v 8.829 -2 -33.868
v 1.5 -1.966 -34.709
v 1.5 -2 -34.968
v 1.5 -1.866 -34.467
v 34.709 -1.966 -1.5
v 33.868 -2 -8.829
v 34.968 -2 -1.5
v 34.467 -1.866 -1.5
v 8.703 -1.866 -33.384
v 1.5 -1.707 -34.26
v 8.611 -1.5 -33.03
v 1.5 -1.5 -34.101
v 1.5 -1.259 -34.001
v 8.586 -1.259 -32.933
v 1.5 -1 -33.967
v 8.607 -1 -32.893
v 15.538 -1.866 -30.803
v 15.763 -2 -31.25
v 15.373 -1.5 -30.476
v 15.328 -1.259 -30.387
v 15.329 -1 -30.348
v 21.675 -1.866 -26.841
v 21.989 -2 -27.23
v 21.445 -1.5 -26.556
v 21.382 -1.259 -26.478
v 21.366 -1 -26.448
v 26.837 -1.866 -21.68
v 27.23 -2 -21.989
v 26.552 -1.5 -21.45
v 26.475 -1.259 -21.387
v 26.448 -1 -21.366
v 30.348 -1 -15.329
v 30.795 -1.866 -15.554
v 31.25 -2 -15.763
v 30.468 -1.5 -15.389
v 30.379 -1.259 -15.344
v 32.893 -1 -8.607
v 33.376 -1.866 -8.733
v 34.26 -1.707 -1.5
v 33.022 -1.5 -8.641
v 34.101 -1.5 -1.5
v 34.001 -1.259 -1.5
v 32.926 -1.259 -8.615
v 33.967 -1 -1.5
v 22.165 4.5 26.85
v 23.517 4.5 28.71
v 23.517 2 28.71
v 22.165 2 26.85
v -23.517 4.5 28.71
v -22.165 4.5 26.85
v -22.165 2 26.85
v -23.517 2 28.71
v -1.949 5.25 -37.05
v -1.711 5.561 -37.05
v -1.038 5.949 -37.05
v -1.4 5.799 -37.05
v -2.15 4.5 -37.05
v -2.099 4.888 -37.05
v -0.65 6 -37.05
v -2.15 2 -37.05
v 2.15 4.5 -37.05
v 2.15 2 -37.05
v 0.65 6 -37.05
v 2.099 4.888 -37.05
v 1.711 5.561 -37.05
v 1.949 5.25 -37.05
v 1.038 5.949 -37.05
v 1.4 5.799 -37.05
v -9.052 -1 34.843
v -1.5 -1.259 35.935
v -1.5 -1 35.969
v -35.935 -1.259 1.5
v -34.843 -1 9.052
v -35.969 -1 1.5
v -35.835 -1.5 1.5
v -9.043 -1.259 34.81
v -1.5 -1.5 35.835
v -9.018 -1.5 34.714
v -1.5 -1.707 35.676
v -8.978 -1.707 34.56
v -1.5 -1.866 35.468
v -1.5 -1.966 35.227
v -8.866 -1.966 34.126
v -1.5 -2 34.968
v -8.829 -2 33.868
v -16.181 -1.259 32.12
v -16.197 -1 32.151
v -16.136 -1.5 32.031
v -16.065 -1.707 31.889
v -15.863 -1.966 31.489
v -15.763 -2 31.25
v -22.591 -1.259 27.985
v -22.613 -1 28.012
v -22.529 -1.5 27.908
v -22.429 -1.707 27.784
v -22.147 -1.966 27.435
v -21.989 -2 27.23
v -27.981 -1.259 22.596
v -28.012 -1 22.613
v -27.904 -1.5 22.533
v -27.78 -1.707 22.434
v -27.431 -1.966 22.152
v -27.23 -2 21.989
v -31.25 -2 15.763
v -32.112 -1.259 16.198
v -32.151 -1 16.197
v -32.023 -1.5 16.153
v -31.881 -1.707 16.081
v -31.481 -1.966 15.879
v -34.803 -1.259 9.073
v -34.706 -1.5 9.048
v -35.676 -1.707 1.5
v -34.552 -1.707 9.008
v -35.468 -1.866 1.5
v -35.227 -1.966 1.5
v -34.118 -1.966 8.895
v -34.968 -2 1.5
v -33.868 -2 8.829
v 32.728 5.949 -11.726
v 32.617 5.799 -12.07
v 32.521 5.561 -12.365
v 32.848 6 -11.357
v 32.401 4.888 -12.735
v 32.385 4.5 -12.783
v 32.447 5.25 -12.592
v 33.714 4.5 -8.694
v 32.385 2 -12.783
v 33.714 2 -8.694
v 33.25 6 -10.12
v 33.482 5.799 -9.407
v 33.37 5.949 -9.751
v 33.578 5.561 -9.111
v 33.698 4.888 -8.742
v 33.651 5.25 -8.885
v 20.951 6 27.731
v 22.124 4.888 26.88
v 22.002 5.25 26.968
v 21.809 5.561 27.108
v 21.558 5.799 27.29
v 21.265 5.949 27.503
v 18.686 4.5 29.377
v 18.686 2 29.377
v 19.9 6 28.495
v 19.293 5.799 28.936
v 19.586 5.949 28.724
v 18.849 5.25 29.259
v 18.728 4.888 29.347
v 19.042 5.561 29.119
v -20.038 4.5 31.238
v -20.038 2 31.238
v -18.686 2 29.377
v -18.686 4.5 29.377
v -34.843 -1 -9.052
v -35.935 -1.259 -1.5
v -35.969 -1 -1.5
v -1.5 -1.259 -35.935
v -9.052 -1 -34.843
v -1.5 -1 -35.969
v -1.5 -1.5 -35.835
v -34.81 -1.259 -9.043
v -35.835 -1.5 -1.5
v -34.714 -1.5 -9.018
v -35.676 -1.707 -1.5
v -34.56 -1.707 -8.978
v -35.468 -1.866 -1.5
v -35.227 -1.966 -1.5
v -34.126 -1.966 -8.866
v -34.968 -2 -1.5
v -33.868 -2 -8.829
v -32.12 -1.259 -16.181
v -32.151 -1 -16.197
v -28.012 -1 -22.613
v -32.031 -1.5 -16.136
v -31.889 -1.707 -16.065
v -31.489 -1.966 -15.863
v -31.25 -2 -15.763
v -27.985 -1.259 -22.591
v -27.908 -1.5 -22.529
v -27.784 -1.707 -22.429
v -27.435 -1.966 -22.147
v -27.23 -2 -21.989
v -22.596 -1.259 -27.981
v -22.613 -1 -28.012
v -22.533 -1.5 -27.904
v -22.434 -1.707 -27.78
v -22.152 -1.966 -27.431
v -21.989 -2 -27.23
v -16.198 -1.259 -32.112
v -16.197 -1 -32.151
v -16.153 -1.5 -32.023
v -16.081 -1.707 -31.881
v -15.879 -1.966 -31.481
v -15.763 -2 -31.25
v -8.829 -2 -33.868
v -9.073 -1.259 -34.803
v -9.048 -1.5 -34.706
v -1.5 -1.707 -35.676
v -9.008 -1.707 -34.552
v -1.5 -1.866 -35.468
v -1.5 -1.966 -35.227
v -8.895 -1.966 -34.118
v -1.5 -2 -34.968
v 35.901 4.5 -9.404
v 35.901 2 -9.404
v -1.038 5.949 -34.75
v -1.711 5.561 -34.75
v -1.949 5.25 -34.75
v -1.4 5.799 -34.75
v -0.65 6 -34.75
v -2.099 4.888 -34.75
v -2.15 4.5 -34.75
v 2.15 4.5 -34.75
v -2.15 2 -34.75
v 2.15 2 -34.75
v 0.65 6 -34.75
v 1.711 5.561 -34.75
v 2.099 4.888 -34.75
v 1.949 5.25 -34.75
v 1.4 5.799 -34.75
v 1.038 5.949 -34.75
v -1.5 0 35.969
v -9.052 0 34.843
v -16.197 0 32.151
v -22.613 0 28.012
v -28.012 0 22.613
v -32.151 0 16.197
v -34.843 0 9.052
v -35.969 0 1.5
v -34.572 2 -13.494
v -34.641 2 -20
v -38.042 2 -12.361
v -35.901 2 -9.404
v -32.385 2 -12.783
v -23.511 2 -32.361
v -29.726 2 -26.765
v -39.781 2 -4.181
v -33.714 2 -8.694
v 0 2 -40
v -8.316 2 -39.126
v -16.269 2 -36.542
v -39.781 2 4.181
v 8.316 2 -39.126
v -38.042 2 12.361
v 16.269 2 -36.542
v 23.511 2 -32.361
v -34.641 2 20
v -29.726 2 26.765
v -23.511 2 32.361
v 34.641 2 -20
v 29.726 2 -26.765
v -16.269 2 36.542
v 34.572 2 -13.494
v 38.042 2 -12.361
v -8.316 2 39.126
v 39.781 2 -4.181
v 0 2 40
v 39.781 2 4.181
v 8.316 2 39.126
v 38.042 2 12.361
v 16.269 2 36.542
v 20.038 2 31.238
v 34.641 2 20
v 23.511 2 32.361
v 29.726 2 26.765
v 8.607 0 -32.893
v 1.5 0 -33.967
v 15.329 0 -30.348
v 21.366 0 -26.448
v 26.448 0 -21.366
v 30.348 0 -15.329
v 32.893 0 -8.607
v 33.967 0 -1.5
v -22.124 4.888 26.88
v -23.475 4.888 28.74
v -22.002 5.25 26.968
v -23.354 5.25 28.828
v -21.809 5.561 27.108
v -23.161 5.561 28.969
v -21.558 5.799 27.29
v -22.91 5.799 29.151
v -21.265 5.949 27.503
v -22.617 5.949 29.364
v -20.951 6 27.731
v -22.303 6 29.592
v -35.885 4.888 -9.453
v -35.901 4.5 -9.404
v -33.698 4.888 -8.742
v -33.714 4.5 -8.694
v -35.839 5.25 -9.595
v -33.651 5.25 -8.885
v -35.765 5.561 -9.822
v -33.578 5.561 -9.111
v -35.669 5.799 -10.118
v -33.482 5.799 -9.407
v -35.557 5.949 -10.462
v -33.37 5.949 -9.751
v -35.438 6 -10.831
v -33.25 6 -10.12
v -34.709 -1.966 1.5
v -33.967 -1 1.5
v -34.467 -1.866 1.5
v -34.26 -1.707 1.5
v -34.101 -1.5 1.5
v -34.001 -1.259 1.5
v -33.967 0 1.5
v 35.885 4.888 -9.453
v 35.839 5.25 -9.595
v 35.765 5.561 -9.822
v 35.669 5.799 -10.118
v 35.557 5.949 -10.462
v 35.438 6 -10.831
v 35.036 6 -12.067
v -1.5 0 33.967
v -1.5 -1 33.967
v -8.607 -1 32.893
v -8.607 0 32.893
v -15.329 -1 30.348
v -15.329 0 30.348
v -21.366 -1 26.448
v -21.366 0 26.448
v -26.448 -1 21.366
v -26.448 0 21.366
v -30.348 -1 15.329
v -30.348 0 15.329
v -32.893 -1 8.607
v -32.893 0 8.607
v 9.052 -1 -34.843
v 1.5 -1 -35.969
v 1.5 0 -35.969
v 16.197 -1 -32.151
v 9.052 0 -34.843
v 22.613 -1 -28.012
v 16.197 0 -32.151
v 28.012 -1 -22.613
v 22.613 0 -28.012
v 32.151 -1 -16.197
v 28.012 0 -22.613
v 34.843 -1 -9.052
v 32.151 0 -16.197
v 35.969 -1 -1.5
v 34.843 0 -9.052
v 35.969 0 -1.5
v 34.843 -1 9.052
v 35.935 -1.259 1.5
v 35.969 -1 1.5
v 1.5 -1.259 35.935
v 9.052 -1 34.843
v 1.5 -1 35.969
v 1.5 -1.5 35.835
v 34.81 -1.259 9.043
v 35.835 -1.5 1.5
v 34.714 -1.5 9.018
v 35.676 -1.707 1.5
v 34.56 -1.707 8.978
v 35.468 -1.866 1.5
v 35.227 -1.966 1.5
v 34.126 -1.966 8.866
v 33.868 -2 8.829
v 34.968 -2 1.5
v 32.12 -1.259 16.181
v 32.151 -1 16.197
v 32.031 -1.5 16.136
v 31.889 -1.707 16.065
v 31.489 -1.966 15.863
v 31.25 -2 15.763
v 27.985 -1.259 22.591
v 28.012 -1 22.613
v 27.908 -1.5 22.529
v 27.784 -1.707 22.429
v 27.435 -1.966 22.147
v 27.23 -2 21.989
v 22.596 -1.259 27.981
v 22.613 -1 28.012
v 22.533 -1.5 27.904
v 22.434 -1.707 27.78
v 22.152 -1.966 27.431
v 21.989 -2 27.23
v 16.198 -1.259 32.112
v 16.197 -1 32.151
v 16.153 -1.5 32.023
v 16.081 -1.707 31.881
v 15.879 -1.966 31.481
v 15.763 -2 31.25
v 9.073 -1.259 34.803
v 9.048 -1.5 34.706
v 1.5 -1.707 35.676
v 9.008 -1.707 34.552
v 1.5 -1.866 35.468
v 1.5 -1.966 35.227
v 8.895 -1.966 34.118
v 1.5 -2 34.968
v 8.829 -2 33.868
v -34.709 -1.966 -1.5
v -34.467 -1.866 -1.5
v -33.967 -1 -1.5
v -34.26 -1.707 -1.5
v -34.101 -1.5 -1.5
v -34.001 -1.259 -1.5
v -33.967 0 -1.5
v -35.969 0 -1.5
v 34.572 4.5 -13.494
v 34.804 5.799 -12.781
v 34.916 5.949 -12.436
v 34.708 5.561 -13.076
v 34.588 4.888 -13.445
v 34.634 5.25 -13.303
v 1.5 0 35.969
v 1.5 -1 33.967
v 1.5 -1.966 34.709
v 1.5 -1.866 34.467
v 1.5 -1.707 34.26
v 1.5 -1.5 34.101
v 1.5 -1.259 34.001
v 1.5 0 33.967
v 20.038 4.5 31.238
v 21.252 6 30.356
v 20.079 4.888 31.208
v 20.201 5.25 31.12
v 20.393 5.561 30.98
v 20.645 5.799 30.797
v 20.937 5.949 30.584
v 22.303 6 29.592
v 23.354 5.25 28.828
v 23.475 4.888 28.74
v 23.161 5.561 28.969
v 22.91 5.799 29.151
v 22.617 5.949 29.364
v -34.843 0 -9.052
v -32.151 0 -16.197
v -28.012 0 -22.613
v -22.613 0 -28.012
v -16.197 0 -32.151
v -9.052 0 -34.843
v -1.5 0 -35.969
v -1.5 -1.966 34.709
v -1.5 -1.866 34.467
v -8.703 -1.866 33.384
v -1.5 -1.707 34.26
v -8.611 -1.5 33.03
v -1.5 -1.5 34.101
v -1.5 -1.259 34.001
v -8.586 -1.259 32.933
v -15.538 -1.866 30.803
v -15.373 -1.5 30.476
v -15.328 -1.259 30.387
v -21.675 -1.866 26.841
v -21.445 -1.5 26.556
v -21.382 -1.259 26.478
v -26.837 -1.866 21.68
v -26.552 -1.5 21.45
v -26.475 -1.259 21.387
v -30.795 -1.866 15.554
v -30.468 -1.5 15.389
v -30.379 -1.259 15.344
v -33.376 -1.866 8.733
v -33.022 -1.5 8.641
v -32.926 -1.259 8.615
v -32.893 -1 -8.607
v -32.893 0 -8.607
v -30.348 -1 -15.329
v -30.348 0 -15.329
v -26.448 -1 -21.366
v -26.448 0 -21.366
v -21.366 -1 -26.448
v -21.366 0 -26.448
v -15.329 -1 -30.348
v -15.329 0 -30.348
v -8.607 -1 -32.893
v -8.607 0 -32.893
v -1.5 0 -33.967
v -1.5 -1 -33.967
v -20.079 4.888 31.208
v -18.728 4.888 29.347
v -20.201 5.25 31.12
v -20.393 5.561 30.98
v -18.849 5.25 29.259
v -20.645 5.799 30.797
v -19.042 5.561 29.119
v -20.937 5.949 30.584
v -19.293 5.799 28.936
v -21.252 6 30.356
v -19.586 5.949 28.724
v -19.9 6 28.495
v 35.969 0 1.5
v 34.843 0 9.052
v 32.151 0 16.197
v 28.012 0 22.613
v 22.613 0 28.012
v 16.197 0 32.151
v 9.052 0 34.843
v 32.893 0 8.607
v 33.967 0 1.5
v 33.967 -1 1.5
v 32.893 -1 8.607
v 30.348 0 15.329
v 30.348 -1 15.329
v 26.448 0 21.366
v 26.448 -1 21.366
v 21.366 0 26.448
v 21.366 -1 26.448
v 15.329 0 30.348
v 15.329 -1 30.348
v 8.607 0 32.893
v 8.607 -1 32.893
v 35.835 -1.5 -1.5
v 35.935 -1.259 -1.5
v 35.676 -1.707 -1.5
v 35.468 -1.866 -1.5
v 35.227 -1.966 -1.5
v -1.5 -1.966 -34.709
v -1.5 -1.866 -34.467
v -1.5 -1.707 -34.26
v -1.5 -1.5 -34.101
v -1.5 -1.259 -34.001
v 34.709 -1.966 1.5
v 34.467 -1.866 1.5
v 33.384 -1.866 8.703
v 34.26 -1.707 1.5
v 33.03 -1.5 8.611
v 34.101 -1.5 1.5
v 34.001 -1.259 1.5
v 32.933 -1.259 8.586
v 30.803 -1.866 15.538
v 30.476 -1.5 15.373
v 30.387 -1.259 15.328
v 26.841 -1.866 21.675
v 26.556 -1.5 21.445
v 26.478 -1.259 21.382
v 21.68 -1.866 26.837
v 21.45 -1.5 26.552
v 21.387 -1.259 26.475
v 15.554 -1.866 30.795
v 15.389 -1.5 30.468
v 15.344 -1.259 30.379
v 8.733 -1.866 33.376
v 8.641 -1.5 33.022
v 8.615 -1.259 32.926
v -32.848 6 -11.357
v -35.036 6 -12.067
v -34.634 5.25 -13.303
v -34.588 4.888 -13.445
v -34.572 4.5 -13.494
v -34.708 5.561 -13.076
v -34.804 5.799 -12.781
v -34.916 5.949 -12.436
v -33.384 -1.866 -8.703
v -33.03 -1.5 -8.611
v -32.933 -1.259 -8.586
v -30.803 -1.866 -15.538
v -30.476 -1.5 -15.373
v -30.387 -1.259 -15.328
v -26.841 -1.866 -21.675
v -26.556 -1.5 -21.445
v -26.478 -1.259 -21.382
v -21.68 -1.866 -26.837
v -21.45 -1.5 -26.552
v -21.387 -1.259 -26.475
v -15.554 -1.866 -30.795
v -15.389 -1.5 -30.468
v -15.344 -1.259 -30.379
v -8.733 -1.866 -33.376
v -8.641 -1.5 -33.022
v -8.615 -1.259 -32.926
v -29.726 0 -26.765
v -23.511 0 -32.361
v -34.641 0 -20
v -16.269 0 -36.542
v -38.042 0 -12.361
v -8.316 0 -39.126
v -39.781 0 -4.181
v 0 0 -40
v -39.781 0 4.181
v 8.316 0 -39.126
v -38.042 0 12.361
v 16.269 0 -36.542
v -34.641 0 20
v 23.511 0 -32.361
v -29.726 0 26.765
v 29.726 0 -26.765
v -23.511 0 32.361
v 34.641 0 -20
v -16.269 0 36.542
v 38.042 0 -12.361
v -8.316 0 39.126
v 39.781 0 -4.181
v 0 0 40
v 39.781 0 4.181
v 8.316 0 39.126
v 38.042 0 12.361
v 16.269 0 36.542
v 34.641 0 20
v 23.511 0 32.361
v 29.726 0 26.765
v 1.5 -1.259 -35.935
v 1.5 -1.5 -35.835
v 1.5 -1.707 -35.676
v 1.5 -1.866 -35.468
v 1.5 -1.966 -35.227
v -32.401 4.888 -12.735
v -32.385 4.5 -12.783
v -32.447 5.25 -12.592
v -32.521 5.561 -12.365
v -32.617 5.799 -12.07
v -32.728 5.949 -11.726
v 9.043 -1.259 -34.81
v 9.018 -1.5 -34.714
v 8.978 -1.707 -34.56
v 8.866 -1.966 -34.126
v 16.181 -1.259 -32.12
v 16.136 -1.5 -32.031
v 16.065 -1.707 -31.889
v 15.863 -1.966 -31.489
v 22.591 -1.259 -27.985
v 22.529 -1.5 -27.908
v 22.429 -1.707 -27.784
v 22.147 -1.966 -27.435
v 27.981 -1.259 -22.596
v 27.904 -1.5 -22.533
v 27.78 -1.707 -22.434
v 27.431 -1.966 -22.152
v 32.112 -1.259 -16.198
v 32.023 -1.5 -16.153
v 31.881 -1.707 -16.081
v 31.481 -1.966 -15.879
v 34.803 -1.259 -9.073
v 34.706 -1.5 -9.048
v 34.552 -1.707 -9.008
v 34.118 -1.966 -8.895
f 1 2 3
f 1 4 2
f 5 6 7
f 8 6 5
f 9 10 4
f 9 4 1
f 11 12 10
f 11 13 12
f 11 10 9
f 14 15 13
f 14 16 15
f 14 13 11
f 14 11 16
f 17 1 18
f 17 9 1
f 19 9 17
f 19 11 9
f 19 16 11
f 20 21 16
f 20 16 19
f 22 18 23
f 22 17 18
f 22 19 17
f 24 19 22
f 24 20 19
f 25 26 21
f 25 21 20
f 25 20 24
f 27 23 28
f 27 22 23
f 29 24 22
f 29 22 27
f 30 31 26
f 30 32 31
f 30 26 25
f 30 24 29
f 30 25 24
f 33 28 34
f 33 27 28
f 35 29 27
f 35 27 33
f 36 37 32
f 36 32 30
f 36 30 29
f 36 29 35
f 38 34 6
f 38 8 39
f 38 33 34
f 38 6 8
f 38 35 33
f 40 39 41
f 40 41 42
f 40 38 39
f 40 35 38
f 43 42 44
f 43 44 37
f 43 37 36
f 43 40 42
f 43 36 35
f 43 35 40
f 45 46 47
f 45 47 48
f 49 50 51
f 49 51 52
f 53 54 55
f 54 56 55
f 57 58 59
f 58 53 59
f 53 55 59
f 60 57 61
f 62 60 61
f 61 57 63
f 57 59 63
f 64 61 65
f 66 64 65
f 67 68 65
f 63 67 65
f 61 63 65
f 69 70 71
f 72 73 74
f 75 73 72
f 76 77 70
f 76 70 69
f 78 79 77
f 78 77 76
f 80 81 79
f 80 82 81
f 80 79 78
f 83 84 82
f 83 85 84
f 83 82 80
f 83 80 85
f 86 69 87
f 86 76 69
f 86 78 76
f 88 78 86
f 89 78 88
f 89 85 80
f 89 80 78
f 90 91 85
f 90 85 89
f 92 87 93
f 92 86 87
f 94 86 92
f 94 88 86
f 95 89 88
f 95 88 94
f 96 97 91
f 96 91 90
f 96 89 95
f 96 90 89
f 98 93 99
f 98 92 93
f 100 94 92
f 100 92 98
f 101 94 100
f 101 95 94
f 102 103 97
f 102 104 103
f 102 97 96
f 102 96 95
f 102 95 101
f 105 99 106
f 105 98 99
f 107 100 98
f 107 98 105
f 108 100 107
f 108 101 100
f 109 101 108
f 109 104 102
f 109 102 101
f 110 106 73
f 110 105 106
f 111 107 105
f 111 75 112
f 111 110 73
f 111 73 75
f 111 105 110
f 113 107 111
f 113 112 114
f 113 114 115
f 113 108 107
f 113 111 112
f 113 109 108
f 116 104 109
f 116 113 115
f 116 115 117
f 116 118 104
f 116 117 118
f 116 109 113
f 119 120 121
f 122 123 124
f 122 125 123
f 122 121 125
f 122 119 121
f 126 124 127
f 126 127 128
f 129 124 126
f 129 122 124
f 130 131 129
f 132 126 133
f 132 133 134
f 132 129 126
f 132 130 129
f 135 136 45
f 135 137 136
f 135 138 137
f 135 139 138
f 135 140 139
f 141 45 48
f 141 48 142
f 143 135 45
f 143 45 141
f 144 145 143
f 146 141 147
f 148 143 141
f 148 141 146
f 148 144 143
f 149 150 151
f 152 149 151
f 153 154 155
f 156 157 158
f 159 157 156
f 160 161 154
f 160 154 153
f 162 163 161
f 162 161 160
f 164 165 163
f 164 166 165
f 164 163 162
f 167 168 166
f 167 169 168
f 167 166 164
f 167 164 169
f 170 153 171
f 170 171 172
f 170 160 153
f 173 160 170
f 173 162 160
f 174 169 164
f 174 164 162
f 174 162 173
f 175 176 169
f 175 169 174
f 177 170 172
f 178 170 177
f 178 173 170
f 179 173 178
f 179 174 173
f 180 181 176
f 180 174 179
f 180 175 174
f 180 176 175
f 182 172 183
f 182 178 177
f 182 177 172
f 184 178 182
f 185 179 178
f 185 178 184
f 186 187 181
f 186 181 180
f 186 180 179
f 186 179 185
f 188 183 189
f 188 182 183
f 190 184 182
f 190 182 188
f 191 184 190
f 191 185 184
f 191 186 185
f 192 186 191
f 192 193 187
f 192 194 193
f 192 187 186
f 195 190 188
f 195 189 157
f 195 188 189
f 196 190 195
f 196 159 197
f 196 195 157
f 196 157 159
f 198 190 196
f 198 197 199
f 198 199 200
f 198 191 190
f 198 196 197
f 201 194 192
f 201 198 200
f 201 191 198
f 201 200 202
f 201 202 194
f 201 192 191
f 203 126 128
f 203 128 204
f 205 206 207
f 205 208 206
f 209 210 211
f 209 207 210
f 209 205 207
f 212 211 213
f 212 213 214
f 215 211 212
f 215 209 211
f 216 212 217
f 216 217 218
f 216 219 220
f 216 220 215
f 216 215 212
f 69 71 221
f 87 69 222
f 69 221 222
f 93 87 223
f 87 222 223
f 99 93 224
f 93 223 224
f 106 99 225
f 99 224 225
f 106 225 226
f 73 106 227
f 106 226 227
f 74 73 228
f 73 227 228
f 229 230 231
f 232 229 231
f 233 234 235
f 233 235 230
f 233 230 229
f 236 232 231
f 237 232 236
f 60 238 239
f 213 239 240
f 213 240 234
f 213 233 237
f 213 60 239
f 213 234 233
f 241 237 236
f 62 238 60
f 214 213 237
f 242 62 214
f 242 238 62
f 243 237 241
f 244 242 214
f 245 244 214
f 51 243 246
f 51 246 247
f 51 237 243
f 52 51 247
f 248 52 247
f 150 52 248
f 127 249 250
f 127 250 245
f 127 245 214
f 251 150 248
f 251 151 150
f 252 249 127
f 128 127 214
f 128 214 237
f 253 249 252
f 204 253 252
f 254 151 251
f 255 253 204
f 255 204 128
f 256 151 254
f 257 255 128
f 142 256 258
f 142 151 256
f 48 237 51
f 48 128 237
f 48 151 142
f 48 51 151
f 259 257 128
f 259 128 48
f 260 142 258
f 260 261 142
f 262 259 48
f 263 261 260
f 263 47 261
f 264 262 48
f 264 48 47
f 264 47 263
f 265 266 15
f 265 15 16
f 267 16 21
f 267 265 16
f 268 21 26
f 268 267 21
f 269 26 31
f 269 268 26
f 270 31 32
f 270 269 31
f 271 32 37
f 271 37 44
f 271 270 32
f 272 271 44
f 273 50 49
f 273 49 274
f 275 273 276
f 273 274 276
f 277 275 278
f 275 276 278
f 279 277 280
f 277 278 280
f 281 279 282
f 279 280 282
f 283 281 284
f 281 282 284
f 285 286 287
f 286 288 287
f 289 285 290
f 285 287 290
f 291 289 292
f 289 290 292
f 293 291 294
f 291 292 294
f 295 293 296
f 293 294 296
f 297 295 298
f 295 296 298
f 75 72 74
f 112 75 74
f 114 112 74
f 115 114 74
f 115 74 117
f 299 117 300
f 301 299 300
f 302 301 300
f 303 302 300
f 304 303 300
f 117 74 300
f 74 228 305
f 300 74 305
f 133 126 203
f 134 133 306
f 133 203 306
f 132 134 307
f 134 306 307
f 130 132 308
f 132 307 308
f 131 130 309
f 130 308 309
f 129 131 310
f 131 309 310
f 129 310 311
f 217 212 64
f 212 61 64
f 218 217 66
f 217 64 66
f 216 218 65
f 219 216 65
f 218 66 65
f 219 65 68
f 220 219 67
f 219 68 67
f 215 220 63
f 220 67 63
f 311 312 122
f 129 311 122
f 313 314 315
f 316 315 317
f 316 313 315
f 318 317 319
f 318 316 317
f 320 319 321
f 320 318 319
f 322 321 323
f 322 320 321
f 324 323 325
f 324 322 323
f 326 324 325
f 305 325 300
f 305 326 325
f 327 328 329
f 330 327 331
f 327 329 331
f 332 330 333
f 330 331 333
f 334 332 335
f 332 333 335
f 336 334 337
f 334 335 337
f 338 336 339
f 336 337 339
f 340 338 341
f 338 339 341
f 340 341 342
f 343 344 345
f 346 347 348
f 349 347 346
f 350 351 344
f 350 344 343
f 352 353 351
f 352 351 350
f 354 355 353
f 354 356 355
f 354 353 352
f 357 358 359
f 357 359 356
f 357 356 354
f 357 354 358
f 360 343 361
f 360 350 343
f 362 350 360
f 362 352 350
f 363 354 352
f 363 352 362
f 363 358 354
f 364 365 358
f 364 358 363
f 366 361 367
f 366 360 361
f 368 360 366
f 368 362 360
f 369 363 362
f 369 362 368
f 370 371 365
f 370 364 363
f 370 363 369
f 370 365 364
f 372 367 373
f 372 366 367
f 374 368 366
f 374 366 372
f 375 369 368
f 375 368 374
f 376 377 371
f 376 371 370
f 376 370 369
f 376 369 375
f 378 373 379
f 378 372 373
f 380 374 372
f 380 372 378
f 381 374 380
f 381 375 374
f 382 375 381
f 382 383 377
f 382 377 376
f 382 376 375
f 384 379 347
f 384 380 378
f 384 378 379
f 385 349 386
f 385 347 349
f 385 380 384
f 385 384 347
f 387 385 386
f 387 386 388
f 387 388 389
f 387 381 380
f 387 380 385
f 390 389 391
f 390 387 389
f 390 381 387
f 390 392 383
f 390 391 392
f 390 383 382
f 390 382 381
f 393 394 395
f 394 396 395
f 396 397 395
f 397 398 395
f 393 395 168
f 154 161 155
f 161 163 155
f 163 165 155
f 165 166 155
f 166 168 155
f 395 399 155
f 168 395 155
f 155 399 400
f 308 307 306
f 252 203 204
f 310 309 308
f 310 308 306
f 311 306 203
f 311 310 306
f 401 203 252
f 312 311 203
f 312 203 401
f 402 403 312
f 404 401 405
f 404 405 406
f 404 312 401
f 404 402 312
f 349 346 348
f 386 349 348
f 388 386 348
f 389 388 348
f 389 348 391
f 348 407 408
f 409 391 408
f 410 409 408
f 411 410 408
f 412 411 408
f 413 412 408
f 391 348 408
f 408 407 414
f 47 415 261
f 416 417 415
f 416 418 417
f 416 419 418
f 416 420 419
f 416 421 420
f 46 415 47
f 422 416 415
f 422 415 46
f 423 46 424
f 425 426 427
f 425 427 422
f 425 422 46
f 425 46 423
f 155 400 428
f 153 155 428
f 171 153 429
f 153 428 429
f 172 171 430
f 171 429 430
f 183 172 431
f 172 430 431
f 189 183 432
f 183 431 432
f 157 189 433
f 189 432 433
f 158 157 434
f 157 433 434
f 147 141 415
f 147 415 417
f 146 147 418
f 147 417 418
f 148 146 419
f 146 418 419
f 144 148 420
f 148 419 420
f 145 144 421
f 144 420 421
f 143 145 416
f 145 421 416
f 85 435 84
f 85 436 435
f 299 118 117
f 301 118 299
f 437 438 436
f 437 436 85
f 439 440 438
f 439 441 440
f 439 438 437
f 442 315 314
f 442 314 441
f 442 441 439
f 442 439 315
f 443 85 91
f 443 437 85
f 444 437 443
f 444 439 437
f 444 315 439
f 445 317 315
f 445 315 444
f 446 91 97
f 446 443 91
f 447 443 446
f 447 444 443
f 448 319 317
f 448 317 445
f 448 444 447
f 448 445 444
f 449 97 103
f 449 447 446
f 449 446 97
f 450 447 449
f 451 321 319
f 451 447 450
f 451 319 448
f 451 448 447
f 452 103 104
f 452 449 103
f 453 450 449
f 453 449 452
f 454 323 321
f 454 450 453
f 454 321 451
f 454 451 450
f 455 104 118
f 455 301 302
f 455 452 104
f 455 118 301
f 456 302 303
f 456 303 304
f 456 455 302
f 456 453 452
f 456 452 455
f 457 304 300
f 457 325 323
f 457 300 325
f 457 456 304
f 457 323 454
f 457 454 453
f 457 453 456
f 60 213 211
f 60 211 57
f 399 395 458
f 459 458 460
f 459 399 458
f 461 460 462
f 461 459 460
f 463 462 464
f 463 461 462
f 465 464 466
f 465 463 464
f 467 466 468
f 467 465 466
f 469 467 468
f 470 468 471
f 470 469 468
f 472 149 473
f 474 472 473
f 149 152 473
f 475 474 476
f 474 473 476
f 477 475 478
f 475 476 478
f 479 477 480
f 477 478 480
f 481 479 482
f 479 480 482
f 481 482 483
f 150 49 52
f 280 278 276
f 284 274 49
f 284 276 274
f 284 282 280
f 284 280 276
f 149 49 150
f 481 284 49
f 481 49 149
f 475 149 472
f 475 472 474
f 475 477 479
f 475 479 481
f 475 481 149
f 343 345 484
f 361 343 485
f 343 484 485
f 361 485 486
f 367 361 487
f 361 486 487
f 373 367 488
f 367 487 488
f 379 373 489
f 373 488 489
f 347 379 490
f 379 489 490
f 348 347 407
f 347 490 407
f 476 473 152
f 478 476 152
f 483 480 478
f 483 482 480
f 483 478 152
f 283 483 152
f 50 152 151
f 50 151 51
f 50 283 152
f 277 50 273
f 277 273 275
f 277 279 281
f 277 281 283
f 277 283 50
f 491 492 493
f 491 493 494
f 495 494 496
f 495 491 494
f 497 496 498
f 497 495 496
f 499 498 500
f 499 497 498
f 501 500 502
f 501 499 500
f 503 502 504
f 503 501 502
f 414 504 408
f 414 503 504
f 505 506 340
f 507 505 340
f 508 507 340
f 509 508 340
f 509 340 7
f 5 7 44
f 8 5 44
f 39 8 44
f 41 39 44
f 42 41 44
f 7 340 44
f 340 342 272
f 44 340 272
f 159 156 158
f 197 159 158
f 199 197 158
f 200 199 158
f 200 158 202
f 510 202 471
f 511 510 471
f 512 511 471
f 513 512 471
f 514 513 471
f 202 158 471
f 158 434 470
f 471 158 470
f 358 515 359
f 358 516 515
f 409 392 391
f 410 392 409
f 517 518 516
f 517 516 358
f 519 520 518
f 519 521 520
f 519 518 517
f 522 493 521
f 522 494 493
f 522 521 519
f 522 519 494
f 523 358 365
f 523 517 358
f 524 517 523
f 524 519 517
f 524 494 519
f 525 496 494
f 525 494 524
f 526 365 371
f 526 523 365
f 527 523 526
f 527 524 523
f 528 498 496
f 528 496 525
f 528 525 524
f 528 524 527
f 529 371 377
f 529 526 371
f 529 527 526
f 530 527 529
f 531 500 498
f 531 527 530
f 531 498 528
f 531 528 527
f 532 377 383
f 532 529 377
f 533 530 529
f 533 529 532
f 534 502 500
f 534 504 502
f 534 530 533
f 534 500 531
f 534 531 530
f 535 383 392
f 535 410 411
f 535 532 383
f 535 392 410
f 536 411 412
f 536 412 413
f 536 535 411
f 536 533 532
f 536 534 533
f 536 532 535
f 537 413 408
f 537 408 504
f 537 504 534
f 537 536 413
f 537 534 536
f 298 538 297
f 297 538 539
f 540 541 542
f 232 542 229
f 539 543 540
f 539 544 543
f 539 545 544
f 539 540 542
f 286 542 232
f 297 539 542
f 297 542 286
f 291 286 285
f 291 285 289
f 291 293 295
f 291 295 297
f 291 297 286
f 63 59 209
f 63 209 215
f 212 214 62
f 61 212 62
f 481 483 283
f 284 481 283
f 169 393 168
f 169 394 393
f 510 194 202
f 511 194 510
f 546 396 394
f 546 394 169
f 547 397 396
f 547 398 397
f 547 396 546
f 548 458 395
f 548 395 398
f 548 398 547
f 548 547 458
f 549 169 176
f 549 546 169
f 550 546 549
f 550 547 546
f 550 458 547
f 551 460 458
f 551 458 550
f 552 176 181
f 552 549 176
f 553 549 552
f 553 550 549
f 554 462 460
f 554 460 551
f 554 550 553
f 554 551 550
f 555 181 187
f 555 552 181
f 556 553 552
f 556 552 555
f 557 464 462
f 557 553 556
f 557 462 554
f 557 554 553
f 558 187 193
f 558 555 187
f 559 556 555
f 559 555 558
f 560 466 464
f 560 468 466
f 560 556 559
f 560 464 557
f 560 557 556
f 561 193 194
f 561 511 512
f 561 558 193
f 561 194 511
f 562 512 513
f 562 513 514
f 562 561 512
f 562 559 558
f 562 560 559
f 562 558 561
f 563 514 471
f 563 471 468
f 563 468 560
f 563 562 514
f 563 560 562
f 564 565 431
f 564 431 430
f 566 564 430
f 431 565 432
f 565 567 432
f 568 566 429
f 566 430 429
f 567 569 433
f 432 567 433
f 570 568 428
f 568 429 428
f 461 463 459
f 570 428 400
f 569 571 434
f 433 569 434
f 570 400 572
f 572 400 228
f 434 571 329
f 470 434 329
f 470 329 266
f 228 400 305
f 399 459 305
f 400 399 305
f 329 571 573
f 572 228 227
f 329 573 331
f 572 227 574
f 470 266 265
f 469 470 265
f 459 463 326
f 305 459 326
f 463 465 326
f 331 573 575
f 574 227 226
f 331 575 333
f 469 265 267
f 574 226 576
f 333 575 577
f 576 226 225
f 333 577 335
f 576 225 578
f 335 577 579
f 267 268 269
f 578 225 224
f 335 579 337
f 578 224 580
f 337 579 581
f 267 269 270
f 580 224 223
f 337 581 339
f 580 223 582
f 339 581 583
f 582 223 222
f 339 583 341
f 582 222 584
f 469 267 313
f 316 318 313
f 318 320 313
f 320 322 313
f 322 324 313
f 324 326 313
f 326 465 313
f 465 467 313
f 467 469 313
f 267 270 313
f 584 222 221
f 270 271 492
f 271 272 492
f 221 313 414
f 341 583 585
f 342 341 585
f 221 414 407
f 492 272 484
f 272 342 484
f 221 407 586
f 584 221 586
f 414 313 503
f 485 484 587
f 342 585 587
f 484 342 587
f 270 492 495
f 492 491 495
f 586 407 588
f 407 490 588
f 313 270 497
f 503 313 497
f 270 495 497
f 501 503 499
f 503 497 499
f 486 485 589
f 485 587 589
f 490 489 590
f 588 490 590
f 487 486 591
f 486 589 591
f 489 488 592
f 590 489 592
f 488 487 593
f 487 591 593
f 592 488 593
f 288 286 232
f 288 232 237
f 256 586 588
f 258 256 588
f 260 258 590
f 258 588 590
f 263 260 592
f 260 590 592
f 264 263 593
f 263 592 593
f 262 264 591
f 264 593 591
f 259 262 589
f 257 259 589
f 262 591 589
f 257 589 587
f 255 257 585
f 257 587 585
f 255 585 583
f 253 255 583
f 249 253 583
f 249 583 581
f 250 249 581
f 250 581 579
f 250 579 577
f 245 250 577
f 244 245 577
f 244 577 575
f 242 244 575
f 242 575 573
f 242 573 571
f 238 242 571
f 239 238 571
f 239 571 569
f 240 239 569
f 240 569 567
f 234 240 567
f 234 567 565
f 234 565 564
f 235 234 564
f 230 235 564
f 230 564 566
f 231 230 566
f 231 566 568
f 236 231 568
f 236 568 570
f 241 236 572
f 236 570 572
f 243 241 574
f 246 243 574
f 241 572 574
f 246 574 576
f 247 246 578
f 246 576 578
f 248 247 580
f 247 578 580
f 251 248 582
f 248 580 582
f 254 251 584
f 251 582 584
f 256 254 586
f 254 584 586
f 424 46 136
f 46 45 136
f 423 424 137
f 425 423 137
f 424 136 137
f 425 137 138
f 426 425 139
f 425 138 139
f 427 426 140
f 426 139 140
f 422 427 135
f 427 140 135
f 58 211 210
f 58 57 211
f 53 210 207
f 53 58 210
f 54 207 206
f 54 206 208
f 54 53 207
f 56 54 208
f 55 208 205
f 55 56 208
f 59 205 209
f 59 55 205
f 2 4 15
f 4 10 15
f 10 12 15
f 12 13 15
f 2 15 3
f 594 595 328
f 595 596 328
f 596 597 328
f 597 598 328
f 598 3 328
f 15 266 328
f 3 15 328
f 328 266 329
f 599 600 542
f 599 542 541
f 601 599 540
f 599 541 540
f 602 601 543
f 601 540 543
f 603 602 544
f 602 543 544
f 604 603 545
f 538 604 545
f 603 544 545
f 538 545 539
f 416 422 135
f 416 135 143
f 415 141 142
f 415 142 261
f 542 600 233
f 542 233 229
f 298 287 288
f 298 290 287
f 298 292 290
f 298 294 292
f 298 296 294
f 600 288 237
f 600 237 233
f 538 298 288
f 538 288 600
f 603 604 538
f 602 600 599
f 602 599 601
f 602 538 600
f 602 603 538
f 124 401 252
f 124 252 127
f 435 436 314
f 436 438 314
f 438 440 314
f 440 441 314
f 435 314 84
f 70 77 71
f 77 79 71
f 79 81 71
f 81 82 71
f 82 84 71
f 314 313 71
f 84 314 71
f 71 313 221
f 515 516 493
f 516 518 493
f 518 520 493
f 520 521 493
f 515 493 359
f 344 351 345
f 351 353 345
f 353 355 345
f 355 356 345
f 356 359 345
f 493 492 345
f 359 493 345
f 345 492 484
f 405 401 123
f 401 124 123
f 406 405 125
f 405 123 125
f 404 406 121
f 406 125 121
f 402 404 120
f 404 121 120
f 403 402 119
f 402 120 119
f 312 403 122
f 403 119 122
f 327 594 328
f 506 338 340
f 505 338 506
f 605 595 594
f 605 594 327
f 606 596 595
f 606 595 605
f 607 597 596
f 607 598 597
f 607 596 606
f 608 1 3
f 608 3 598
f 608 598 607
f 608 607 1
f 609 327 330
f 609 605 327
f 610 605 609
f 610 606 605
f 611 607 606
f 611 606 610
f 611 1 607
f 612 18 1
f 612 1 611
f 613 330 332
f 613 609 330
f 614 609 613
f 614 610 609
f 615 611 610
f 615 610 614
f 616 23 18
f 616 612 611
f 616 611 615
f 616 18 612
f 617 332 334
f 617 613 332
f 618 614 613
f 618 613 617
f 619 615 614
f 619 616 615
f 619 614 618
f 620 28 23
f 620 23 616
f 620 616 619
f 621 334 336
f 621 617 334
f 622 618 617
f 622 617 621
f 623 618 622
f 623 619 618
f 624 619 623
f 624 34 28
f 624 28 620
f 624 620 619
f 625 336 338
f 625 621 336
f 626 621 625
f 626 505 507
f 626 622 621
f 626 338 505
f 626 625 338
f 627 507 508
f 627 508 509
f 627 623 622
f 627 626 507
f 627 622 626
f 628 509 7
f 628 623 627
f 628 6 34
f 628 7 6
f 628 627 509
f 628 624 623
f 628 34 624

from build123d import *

# Parameters (mm, degrees)
SKETCH1_R           = 40
BOSS_EXTRUDE1_DEPTH = 2
SKETCH2_W           = 4.6
SKETCH2_H           = 2.6
BOSS_EXTRUDE2_DEPTH = 4
SKETCH3_R           = 36
SKETCH3_R_2         = 34
BOSS_EXTRUDE3_DEPTH = 2
FILLET2_R           = 1
CUT_EXTRUDE1_DEPTH  = 2
SKETCH5_W           = 4.6
SKETCH5_H           = 2.6
SKETCH5_W_2         = 4.3
SKETCH5_H_2         = 2.3
CUT_EXTRUDE2_DEPTH  = 4
FILLET3_R           = 1.5


with BuildPart() as part:
    # Sketch1 → Boss-Extrude1 (new body)
    with BuildSketch(Plane(origin=(0, 0, 0), x_dir=(1, 0, 0), z_dir=(0, 1, 0))):
        with Locations(Location((0, 0, 0), (0, 0, 270))):
            Circle(SKETCH1_R)
    extrude(amount=BOSS_EXTRUDE1_DEPTH)

    # Sketch2 → Boss-Extrude2 (add)
    with BuildSketch(Plane(origin=(0, 2, 0), x_dir=(1, 0, 0), z_dir=(0, 1, 0))):
        with Locations((0, 35.9)):
            Rectangle(SKETCH2_W, SKETCH2_H)
        Polygon((34.668563319, 13.682862178), (36.090041493, 9.308002203), (33.617294551, 8.504558018), (32.195816377, 12.879417993), align=None)
        Polygon((23.726350472, -28.74352611), (20.004872298, -31.447338271), (18.476630642, -29.343894086), (22.198108816, -26.640081925), align=None)
        Polygon((-20.004872298, -31.447338271), (-23.726350472, -28.74352611), (-22.198108816, -26.640081925), (-18.476630642, -29.343894086), align=None)
        Polygon((-36.090041493, 9.308002203), (-34.668563319, 13.682862178), (-32.195816377, 12.879417993), (-33.617294551, 8.504558018), align=None)
    extrude(amount=BOSS_EXTRUDE2_DEPTH)

    # Sketch3 → Boss-Extrude3 (add)
    with BuildSketch(Plane.XZ):
        with Locations(Location((0, 0, 0), (0, 0, 90))):
            Circle(SKETCH3_R)
        with Locations(Location((0, 0, 0), (0, 0, 270))):
            Circle(SKETCH3_R_2, mode=Mode.SUBTRACT)
    extrude(amount=BOSS_EXTRUDE3_DEPTH)

    # Fillet2
    fillet2_edges = [part.edges().sort_by_distance(p)[0] for p in [
        (0, -2, -36),
        (0, -2, 34),
    ]]
    fillet(fillet2_edges, radius=FILLET2_R - 0.0001)  # a hair under: the kernel refuses the full size

    # Sketch4 → Cut-Extrude1 (cut)
    with BuildSketch(Plane.XZ):
        Polygon((-1.5, -40), (-1.5, -1.5), (-40, -1.5), (-40, 1.5), (-1.5, 1.5), (-1.5, 40), (1.5, 40), (1.5, 1.5), (40, 1.5), (40, -1.5), (1.5, -1.5), (1.5, -40), align=None)
    extrude(amount=CUT_EXTRUDE1_DEPTH, mode=Mode.SUBTRACT)

    # Sketch5 → Cut-Extrude2 (cut)
    # profile 1 of 5: a face of its own
    with BuildSketch(Plane(origin=(0, 6, 0), x_dir=(1, 0, 0), z_dir=(0, 1, 0))):
        Polygon((34.668563319, 13.682862178), (32.195816377, 12.879417993), (33.617294551, 8.504558018), (36.090041493, 9.308002203), align=None)
        Polygon((34.572257391, 13.493851152), (32.384827403, 12.783112065), (33.713600479, 8.693569044), (35.901030467, 9.404308132), align=None, mode=Mode.SUBTRACT)
    # profile 2 of 5: a face of its own
    with BuildSketch(Plane(origin=(0, 6, 0), x_dir=(1, 0, 0), z_dir=(0, 1, 0))):
        with Locations((0, 35.9)):
            Rectangle(SKETCH5_W, SKETCH5_H)
        with Locations((0, 35.9)):
            Rectangle(SKETCH5_W_2, SKETCH5_H_2, mode=Mode.SUBTRACT)
    # profile 3 of 5: a face of its own
    with BuildSketch(Plane(origin=(0, 6, 0), x_dir=(1, 0, 0), z_dir=(0, 1, 0))):
        Polygon((23.726350472, -28.74352611), (22.198108816, -26.640081925), (18.476630642, -29.343894086), (20.004872298, -31.447338271), align=None)
        Polygon((23.516830135, -28.710341349), (22.164924055, -26.849602262), (18.686150979, -29.377078847), (20.03805706, -31.237817934), align=None, mode=Mode.SUBTRACT)
    # profile 4 of 5: a face of its own
    with BuildSketch(Plane(origin=(0, 6, 0), x_dir=(1, 0, 0), z_dir=(0, 1, 0))):
        Polygon((-20.004872298, -31.447338271), (-18.476630642, -29.343894086), (-22.198108816, -26.640081925), (-23.726350472, -28.74352611), align=None)
        Polygon((-20.03805706, -31.237817934), (-18.686150979, -29.377078847), (-22.164924055, -26.849602262), (-23.516830135, -28.710341349), align=None, mode=Mode.SUBTRACT)
    # profile 5 of 5: a face of its own
    with BuildSketch(Plane(origin=(0, 6, 0), x_dir=(1, 0, 0), z_dir=(0, 1, 0))):
        Polygon((-36.090041493, 9.308002203), (-33.617294551, 8.504558018), (-32.195816377, 12.879417993), (-34.668563319, 13.682862178), align=None)
        Polygon((-35.901030467, 9.404308132), (-33.713600479, 8.693569044), (-32.384827403, 12.783112065), (-34.572257391, 13.493851152), align=None, mode=Mode.SUBTRACT)
    extrude(amount=-CUT_EXTRUDE2_DEPTH, mode=Mode.SUBTRACT)

    # Fillet3
    fillet3_edges = [part.edges().sort_by_distance(p)[0] for p in [
        (-2.15, 6, -35.9),
        (2.15, 6, -35.9),
        (33.478542397, 6, -13.138481608),
        (34.807315473, 6, -9.048938588),
        (22.840877095, 6, 27.779971806),
        (19.362104019, 6, 30.30744839),
        (-19.362104019, 6, 30.30744839),
        (-22.840877095, 6, 27.779971806),
        (-34.807315473, 6, -9.048938588),
        (-33.478542397, 6, -13.138481608),
    ]]
    fillet(fillet3_edges, radius=FILLET3_R)


solid = part.part
